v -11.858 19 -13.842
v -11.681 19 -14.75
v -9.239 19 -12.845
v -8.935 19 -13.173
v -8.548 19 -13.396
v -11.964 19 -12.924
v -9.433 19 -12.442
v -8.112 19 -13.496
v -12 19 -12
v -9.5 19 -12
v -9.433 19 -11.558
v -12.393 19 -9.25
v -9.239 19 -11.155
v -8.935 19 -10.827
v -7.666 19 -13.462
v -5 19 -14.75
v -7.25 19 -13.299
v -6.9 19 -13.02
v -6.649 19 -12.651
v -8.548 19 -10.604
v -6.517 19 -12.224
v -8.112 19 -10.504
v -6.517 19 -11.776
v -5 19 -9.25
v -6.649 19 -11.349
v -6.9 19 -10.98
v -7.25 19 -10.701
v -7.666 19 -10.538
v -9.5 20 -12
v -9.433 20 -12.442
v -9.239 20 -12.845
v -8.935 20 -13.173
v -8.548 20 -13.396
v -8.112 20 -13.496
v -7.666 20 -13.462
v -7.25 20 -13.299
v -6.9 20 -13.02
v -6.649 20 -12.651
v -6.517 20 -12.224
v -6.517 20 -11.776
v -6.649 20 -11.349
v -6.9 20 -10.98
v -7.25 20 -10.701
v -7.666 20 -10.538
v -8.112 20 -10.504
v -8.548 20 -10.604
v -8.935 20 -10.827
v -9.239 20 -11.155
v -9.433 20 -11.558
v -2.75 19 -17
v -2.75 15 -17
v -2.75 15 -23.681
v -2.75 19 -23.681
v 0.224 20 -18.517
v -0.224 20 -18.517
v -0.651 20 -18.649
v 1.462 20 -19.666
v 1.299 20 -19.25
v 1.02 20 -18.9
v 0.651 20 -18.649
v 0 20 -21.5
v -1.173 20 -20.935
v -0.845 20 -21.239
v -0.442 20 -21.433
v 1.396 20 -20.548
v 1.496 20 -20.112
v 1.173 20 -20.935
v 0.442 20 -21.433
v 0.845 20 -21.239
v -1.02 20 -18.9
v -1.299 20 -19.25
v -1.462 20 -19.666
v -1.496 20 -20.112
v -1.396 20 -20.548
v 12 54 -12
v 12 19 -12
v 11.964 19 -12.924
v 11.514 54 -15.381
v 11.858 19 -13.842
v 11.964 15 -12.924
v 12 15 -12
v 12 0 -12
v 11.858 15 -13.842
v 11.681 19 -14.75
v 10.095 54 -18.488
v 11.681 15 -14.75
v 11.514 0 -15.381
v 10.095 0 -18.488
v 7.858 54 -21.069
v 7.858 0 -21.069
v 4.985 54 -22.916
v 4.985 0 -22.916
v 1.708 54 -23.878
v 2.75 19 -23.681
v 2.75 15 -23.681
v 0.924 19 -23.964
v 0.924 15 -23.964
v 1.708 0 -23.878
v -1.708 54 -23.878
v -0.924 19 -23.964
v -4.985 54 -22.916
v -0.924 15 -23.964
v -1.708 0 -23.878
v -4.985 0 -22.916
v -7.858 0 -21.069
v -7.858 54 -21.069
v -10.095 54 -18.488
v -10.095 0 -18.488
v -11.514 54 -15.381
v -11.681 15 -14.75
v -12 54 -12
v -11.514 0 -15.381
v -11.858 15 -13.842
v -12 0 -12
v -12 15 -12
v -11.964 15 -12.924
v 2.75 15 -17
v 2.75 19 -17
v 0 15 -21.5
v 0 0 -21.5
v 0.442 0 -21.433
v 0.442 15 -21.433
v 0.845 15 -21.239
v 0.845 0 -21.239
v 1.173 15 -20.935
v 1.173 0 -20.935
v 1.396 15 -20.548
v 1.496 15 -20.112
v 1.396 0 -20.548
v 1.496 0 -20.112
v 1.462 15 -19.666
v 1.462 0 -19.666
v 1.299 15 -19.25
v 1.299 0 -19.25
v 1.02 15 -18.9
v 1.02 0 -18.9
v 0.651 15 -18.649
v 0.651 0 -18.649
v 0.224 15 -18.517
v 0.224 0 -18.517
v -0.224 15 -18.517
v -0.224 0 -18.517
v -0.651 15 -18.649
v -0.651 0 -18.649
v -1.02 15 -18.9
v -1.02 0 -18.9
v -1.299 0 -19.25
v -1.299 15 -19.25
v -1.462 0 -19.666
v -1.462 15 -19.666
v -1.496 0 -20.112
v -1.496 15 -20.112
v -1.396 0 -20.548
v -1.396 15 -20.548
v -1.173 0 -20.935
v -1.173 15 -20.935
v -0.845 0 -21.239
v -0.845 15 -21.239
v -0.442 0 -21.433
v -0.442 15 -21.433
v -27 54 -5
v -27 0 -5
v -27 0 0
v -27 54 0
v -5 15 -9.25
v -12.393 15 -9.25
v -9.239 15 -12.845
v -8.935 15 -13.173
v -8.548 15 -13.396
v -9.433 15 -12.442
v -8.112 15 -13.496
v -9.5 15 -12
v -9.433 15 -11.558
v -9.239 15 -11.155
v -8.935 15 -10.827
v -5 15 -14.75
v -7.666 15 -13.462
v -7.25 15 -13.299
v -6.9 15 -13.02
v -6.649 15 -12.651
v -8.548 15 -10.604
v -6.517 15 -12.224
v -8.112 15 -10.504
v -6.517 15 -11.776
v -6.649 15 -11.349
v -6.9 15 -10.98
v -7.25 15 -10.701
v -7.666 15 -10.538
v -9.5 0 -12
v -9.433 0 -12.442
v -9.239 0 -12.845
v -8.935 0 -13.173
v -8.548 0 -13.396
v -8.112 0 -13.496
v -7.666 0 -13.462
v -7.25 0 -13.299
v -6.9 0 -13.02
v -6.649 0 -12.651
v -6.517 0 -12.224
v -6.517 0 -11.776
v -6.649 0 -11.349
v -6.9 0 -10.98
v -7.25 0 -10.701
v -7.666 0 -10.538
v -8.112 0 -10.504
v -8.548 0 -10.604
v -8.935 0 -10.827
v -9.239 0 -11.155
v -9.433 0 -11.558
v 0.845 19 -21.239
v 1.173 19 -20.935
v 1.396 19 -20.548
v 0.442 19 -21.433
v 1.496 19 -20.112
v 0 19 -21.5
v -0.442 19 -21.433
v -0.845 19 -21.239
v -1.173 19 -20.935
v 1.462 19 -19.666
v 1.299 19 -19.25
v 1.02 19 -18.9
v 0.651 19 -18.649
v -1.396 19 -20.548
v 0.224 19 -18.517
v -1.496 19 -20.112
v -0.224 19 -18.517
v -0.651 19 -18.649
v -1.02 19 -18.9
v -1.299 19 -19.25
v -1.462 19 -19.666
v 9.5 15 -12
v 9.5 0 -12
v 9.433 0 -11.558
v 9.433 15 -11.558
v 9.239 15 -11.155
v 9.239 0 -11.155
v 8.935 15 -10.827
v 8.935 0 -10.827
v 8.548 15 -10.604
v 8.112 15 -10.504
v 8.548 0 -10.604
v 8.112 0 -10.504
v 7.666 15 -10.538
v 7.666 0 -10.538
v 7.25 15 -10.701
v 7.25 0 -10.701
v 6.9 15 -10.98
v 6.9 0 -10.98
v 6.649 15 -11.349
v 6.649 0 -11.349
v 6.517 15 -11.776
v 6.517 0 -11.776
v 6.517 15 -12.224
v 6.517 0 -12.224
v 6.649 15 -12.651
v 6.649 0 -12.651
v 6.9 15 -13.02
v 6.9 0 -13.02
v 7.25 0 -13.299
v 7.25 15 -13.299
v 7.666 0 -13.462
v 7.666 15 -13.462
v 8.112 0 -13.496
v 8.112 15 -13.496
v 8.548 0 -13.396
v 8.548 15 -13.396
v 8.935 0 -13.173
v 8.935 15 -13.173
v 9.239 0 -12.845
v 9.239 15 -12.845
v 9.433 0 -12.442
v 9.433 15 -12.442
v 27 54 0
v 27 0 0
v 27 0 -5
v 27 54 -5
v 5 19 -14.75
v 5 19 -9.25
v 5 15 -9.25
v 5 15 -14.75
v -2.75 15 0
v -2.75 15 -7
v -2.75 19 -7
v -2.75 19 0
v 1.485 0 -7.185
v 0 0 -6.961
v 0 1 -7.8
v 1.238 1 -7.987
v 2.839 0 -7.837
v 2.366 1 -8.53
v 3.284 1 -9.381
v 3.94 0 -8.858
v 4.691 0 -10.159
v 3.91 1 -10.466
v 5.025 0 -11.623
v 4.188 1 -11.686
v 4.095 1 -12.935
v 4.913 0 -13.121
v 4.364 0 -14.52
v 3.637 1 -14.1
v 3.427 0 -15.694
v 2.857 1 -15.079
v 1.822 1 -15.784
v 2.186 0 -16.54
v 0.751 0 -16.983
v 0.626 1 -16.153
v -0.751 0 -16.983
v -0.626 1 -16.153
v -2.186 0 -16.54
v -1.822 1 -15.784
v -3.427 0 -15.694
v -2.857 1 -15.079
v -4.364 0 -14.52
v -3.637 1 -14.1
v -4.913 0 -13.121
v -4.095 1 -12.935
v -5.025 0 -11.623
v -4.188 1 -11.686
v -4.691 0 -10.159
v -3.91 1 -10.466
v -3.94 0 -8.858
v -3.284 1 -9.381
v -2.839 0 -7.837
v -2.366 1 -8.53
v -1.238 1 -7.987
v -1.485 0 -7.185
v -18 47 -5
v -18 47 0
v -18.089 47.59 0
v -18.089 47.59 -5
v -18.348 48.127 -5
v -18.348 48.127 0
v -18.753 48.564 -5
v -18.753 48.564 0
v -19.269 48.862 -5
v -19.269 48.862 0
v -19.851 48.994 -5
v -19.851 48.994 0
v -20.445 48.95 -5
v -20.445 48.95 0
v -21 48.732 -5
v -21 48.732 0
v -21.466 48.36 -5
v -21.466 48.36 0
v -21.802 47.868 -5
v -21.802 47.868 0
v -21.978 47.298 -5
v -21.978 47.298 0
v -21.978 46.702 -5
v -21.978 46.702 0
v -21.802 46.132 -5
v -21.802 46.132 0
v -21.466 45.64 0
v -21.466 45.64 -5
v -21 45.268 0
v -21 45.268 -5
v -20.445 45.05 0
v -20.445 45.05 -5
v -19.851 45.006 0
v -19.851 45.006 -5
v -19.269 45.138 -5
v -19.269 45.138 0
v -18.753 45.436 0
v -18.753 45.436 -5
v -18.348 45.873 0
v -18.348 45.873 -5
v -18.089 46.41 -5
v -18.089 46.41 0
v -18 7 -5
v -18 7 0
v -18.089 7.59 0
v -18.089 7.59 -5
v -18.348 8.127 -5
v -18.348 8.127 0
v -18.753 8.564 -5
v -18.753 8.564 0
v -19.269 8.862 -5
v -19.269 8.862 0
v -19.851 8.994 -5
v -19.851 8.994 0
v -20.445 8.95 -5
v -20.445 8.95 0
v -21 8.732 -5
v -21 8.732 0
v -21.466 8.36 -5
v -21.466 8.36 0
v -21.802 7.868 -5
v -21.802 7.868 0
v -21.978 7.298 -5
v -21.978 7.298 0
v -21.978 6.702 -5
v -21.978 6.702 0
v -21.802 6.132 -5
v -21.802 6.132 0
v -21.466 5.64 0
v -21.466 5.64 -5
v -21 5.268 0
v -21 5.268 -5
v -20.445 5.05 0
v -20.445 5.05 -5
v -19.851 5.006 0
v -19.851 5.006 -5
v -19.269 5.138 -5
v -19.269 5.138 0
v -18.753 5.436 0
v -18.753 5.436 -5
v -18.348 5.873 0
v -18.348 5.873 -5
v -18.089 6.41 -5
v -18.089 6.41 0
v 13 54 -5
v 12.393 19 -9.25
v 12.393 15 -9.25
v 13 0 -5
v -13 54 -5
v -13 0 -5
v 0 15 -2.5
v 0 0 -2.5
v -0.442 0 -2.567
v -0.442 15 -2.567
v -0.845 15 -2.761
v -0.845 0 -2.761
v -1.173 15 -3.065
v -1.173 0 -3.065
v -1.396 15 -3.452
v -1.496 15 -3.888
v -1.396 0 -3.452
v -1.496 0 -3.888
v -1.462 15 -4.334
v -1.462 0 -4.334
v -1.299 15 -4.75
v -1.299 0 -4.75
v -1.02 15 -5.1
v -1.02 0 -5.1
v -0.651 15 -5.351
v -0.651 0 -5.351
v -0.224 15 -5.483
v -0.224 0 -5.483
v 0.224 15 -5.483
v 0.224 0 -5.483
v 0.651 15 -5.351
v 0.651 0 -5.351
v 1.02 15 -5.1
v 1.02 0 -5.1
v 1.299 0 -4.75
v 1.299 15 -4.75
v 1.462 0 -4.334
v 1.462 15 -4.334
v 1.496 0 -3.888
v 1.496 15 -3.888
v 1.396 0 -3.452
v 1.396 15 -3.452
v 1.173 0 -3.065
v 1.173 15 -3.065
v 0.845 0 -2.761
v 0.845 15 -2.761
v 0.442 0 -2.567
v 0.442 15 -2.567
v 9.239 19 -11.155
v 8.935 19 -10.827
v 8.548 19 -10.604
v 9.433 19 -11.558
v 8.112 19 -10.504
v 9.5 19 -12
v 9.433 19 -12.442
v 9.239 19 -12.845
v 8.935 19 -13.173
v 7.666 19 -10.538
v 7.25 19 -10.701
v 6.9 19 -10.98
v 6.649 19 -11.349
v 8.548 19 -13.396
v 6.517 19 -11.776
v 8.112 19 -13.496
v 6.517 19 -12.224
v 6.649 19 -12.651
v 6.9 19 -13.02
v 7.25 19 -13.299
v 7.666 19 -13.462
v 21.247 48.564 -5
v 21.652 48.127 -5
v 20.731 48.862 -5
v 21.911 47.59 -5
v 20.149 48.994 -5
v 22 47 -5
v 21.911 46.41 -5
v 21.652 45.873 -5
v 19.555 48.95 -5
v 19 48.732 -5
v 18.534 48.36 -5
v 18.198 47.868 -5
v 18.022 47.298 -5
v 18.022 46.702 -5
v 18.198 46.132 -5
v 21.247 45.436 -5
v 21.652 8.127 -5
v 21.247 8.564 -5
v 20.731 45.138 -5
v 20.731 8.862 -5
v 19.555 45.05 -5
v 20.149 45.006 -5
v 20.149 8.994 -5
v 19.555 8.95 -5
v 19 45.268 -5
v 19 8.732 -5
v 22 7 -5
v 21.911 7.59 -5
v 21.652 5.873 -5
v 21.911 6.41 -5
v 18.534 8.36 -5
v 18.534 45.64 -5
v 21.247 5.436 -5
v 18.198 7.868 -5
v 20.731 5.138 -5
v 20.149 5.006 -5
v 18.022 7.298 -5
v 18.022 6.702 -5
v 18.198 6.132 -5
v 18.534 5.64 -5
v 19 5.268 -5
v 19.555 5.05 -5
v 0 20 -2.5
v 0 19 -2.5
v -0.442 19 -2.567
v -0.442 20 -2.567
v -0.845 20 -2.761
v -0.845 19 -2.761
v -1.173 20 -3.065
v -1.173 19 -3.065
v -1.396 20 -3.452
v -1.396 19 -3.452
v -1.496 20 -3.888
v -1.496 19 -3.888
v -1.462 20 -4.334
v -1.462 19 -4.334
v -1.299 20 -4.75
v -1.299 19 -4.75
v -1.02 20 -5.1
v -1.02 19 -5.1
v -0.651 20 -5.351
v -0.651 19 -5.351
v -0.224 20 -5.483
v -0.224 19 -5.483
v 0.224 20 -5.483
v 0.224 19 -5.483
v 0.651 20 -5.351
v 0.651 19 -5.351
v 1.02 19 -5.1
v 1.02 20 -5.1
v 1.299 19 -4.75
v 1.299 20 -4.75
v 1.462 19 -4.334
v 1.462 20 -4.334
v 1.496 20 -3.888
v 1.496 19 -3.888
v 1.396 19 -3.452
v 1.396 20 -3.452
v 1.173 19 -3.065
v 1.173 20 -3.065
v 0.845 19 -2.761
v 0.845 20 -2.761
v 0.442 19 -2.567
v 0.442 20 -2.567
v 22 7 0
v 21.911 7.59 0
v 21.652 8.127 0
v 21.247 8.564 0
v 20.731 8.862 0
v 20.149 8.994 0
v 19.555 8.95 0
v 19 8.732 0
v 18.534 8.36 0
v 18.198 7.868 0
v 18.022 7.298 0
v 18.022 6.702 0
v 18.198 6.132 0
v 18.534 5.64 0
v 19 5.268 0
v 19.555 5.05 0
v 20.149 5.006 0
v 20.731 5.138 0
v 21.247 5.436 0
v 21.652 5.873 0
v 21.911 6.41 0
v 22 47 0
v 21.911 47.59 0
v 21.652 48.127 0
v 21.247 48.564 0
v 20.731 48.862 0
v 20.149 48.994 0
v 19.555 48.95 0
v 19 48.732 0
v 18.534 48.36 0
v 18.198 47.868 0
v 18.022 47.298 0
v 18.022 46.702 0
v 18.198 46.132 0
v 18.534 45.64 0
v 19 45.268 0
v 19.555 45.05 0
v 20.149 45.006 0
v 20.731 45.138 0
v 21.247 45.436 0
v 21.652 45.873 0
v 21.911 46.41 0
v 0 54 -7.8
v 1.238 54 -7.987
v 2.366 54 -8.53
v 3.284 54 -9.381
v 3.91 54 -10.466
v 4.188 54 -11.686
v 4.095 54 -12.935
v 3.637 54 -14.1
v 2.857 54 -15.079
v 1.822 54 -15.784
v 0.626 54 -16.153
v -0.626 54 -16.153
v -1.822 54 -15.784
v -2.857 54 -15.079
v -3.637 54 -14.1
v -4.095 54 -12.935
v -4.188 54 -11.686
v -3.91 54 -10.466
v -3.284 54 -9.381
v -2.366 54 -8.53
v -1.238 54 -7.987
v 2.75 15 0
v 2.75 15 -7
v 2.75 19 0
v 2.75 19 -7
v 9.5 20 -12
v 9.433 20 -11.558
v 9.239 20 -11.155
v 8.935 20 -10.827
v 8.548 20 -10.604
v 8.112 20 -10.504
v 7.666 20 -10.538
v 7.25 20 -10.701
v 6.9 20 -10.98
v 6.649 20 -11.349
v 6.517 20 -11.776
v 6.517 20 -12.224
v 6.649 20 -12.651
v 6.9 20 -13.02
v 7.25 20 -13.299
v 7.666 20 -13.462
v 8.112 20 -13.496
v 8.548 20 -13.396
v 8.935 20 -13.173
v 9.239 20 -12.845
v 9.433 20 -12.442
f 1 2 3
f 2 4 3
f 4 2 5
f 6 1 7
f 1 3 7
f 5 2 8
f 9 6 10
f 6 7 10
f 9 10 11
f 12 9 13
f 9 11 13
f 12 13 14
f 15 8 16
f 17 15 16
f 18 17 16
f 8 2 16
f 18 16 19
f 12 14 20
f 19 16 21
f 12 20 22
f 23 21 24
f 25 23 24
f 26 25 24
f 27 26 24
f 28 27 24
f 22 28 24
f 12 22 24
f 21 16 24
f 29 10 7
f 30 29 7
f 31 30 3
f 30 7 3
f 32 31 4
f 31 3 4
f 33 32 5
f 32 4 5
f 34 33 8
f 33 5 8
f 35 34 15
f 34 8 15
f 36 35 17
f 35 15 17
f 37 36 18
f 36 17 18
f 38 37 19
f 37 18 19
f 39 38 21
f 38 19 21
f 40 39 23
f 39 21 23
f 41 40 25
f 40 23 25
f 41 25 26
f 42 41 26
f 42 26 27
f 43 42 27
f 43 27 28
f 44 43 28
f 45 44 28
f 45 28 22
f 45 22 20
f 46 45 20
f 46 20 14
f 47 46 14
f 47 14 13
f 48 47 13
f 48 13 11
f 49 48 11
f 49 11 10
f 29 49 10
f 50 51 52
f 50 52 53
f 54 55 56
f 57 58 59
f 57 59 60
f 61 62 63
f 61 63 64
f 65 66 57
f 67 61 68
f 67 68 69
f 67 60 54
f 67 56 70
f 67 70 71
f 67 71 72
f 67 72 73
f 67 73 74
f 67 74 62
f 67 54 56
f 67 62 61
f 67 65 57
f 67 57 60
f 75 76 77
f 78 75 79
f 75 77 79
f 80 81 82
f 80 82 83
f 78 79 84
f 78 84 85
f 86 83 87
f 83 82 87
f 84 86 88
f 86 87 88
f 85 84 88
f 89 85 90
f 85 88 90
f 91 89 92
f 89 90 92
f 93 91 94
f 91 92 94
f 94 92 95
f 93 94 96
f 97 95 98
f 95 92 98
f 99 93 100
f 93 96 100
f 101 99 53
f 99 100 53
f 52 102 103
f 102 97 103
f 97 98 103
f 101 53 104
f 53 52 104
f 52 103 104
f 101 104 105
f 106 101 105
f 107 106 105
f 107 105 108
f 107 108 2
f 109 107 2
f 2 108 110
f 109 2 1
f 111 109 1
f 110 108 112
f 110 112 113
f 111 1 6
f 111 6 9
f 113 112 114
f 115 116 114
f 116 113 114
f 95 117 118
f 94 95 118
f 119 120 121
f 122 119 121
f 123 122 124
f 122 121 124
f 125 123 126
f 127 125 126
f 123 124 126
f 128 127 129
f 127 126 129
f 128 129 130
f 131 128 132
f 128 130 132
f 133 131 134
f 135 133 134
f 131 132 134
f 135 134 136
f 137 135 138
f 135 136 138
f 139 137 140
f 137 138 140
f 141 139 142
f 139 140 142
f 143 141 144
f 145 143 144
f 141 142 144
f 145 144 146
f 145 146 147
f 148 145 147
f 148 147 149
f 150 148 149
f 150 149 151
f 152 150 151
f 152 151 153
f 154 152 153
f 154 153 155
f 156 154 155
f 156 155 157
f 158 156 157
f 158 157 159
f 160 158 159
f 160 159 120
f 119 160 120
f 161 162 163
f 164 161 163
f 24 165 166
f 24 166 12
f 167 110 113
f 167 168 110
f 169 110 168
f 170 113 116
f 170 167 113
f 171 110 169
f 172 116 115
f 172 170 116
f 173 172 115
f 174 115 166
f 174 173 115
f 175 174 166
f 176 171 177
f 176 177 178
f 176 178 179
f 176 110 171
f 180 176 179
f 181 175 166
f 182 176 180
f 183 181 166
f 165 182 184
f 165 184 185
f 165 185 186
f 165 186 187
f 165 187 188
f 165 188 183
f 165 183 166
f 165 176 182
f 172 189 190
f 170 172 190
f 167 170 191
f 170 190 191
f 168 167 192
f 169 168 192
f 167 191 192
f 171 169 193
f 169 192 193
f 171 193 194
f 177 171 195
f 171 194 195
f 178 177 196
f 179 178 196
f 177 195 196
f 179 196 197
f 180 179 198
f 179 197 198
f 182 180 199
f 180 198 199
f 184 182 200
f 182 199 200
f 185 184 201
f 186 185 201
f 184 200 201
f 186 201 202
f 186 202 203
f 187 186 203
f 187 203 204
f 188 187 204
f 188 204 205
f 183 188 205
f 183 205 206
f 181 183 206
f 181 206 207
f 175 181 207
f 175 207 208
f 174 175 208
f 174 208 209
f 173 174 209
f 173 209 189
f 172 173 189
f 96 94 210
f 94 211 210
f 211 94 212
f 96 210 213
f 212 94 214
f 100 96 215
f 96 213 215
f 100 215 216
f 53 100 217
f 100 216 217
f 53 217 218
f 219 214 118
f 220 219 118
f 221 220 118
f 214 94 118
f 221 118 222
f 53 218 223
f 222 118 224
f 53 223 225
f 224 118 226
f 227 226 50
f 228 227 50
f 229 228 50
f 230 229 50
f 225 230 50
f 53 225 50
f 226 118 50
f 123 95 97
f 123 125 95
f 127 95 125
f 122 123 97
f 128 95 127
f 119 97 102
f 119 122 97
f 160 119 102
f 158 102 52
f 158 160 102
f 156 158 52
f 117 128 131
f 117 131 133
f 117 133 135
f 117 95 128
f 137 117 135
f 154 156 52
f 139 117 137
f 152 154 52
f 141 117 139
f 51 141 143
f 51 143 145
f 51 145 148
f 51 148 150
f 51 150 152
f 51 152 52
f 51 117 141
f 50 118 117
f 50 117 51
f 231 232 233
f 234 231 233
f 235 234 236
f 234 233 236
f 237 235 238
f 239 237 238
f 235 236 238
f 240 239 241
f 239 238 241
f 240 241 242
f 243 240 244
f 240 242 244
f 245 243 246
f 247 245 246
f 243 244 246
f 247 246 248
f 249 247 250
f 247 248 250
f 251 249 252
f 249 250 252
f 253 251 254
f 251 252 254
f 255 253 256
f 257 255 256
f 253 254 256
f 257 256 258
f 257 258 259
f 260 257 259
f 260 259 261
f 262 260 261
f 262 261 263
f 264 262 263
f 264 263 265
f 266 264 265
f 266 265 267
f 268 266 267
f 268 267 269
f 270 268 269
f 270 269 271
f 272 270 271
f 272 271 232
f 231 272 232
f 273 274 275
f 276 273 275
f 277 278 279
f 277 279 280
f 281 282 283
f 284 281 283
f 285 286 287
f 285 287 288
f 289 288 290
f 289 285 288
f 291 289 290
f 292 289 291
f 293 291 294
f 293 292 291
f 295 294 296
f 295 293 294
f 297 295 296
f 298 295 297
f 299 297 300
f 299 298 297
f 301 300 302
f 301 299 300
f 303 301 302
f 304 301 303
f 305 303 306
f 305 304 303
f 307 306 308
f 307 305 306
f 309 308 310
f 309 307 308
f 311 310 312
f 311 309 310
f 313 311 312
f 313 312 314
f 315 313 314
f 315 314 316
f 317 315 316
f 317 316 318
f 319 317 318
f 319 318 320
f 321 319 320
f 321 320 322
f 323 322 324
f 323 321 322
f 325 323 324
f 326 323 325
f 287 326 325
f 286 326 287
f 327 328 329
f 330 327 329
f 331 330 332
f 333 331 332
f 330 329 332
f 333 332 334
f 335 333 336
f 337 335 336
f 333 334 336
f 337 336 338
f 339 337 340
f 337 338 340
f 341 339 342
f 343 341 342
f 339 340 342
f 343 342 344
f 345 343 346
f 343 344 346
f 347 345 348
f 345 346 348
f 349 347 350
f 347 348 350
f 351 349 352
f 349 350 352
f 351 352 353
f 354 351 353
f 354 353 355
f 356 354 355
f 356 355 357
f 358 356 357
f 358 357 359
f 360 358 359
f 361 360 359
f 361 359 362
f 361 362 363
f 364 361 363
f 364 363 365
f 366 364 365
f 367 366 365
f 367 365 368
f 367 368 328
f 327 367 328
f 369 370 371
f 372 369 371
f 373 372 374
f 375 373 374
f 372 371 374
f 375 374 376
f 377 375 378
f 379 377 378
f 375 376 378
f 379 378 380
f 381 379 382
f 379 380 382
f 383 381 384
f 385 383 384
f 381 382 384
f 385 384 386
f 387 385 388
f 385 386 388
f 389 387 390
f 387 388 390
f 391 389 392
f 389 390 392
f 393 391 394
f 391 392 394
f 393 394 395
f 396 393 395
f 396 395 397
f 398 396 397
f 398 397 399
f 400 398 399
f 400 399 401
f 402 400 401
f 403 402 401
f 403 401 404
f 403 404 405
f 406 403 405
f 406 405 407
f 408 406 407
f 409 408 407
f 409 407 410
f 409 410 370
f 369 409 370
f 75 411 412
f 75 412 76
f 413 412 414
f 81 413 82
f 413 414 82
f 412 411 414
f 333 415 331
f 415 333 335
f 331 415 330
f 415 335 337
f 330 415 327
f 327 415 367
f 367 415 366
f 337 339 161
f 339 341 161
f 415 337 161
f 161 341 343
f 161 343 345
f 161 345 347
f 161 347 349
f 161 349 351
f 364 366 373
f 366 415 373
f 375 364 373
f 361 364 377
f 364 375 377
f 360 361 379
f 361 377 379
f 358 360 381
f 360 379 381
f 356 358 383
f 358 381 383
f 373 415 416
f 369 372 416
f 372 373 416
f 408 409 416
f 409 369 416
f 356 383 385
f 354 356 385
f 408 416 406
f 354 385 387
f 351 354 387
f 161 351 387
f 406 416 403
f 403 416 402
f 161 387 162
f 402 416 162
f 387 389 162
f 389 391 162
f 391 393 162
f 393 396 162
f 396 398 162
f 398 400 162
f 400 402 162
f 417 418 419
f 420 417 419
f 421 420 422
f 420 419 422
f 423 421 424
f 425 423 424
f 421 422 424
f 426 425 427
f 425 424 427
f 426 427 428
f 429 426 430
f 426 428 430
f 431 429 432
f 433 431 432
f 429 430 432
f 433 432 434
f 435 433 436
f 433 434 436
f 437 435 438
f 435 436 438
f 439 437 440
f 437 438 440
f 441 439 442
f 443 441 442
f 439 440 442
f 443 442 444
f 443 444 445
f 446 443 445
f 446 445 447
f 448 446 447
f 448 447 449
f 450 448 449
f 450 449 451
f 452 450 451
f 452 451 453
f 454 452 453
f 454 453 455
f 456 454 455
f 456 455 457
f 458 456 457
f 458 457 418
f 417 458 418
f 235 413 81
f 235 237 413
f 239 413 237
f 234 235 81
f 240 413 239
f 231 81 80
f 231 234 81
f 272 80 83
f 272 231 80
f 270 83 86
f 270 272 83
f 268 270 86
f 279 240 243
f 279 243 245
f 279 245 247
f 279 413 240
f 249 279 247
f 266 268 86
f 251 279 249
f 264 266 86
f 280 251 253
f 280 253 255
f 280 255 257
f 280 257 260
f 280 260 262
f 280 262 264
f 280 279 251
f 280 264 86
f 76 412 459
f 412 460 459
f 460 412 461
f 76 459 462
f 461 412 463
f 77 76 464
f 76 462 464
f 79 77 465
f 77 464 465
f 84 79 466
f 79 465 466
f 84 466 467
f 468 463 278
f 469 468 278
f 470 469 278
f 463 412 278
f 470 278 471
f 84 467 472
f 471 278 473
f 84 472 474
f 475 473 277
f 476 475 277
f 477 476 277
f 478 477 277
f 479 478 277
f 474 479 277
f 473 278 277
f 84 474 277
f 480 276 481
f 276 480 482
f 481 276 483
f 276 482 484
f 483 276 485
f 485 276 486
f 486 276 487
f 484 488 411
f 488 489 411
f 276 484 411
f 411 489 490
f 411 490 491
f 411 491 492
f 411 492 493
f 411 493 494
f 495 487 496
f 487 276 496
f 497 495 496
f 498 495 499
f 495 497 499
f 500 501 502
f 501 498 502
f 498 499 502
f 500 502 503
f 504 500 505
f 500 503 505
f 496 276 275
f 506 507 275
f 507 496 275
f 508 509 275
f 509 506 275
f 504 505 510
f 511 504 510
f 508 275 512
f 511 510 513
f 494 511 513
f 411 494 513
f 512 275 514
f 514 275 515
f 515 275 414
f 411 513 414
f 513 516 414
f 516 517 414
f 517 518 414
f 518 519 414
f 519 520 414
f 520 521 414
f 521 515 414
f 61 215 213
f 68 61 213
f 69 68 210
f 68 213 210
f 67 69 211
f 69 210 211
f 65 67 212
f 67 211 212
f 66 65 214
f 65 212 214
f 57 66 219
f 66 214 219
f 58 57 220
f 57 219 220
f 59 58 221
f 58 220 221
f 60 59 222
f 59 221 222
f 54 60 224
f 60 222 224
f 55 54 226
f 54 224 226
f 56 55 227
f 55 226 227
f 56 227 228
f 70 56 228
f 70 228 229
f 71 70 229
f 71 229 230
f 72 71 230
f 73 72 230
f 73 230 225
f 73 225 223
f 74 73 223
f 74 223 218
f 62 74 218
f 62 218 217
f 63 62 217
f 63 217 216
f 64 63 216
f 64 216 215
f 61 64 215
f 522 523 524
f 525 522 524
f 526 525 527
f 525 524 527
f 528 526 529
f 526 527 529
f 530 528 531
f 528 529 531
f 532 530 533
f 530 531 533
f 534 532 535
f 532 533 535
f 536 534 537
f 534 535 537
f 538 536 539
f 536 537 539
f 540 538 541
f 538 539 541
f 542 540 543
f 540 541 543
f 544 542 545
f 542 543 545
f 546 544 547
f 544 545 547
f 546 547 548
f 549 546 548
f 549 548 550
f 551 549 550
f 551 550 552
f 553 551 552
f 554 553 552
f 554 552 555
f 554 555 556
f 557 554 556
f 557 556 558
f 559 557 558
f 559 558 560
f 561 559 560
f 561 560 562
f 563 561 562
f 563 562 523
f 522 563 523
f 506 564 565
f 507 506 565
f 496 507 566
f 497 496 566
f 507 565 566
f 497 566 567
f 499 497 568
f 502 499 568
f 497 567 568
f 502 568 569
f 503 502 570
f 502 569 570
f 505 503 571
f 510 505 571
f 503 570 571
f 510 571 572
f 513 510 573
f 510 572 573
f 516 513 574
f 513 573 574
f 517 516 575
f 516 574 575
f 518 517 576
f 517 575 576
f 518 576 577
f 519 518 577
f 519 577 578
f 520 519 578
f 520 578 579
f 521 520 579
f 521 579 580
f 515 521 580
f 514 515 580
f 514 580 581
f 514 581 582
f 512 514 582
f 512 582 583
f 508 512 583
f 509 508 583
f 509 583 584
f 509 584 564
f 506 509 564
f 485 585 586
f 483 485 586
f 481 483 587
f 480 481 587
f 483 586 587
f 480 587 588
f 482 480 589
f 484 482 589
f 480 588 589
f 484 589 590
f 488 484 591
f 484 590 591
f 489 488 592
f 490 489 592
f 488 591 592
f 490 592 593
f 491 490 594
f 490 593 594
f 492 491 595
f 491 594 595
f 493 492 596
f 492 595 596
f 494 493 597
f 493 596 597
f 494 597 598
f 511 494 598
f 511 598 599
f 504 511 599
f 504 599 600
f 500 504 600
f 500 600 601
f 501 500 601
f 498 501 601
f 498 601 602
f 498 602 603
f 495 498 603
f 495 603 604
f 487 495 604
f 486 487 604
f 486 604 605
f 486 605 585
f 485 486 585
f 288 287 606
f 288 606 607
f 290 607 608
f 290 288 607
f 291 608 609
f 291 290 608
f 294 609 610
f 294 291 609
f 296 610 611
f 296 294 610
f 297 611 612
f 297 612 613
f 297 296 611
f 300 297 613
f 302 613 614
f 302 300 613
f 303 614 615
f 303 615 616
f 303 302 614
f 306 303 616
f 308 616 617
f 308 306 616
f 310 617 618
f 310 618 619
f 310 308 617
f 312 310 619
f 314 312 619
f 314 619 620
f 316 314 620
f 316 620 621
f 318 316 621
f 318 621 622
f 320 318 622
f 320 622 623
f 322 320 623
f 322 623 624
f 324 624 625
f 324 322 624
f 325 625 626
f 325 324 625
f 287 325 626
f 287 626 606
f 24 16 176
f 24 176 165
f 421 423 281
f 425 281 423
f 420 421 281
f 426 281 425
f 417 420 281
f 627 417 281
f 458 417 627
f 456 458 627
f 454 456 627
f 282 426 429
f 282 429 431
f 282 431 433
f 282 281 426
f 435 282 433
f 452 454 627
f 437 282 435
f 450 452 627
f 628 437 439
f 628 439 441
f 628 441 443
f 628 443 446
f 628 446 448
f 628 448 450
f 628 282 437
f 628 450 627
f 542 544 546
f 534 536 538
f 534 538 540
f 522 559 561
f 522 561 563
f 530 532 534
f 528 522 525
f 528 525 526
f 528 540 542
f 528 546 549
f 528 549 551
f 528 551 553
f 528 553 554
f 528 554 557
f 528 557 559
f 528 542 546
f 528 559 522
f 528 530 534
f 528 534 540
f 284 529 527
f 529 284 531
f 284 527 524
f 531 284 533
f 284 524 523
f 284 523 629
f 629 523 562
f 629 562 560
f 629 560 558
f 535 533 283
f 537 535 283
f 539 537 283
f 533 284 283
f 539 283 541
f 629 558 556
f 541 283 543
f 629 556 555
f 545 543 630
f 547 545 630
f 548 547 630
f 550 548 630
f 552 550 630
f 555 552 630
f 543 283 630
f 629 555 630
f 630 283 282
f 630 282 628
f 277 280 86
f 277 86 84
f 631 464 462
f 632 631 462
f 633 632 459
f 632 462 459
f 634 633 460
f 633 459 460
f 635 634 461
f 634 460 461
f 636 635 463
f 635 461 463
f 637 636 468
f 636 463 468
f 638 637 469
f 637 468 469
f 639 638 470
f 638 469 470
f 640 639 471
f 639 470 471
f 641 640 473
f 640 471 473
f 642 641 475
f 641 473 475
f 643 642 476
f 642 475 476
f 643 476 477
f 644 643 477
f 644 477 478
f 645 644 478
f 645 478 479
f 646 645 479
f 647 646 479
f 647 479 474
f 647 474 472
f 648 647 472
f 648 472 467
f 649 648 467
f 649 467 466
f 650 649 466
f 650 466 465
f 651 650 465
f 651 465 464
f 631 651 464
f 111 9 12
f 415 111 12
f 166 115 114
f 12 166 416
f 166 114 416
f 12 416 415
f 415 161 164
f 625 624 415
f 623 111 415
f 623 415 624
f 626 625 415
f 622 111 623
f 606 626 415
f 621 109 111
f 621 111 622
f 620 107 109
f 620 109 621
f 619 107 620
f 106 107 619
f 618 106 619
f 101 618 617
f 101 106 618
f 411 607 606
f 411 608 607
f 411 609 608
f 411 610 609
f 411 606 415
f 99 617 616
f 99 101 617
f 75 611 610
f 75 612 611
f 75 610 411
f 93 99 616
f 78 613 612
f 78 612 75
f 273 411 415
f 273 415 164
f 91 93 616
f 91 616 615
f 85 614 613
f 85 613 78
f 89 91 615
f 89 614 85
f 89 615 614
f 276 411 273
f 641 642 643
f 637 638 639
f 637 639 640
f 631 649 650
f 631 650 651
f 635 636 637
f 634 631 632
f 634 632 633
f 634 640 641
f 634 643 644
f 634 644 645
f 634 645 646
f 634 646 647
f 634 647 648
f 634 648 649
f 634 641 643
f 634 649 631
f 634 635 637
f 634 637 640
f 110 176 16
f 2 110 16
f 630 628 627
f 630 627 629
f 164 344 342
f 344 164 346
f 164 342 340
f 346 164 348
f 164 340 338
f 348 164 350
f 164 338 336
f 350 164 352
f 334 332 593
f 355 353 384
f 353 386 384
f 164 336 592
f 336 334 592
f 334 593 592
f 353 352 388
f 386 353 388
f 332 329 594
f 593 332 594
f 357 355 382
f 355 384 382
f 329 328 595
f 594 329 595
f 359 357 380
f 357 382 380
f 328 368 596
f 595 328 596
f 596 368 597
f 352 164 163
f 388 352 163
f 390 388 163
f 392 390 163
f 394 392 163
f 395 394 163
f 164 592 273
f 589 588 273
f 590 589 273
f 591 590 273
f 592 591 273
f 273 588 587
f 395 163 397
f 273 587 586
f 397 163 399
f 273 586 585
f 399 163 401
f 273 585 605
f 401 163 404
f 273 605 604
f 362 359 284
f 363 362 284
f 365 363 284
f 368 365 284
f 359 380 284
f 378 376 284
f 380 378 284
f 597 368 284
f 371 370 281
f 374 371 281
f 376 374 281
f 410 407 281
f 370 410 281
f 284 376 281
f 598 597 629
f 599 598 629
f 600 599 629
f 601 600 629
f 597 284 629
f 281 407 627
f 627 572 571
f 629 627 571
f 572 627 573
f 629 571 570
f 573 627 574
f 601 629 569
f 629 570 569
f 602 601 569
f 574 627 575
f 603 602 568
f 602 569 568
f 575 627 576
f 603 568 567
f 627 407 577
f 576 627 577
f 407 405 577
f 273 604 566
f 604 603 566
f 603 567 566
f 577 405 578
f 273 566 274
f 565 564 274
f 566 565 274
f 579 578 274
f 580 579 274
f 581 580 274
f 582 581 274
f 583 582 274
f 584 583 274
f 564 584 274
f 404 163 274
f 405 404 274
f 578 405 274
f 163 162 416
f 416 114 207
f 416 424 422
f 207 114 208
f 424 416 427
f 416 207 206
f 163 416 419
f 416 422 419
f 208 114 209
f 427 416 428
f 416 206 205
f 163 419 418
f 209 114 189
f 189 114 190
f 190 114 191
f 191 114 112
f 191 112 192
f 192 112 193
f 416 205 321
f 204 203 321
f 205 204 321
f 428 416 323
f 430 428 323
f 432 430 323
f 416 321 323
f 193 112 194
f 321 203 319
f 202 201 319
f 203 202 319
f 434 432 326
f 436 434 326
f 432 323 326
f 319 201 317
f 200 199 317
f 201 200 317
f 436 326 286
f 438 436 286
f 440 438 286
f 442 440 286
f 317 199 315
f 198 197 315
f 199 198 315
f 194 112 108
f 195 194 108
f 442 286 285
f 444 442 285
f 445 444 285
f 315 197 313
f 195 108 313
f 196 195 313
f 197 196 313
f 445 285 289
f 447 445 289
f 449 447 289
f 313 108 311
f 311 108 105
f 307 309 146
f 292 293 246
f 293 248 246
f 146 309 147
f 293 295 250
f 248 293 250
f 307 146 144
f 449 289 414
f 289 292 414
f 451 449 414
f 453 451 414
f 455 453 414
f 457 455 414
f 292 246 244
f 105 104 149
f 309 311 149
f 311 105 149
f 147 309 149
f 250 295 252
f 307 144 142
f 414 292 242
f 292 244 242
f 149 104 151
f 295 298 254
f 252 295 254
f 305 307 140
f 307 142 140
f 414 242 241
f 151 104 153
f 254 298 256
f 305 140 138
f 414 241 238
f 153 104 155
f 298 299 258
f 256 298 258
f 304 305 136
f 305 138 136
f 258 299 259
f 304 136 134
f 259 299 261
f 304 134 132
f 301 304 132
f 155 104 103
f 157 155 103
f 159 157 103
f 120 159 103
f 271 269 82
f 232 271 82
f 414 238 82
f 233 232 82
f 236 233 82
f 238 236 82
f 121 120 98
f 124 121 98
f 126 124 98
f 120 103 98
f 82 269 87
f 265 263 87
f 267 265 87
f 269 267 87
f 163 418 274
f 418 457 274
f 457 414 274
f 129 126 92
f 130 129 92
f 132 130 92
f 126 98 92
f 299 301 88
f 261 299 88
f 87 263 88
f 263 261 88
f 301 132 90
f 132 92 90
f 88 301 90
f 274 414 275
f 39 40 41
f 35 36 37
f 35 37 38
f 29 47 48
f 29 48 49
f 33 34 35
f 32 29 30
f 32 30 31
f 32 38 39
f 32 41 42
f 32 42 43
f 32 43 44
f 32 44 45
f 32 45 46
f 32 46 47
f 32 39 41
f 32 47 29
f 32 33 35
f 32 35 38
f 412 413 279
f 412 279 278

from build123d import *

# Parameters (mm, degrees)
SZKIC1_R                    = 12
SZKIC1_R_2                  = 4.2
DODANIE_WYCI_GNI_CIE1_DEPTH = 54
DODANIE_WYCI_GNI_CIE2_DEPTH = 54
SZKIC4_R                    = 1.5
WYTNIJ_WYCI_GNI_CIE1_DEPTH  = 20
SZYK_KO_OWY1_COUNT          = 4
WYTNIJ_WYCI_GNI_CIE2_START  = -7
SZKIC5_W                    = 5.5
SZKIC5_H                    = 4
WYTNIJ_WYCI_GNI_CIE2_DEPTH  = 10
SZYK_KO_OWY2_COUNT          = 4
SFAZOWANIE1_SIZE            = 1
SFAZOWANIE1_SIZE2           = 0.839099631
WYTNIJ_WYCI_GNI_CIE3_REACH  = 66.969
SZKIC6_R                    = 2


with BuildPart() as part:
    # Szkic1 → Dodanie-wyciągnięcie1 (new body)
    with BuildSketch(Plane(origin=(0, 0, 0), x_dir=(1, 0, 0), z_dir=(0, 1, 0))):
        with Locations(Location((0, 12, 0), (0, 0, 270))):
            Circle(SZKIC1_R)
        with Locations(Location((0, 12, 0), (0, 0, 270))):
            Circle(SZKIC1_R_2, mode=Mode.SUBTRACT)
    extrude(amount=DODANIE_WYCI_GNI_CIE1_DEPTH)

    # Szkic3 → Dodanie-wyciągnięcie2 (add)
    with BuildSketch(Plane(origin=(0, 0, 0), x_dir=(1, 0, 0), z_dir=(0, 1, 0))):
        Polygon((0, 0), (27, 0), (27, 5), (13, 5), (12, 12), (0, 5.166487606), (-12, 12), (-13, 5), (-27, 5), (-27, 0), align=None)
    extrude(amount=DODANIE_WYCI_GNI_CIE2_DEPTH)

    # Szkic4 → Wytnij-wyciągnięcie1 (cut)
    with BuildSketch(Plane(origin=(0, 0, 0), x_dir=(-1, 0, 0), z_dir=(0, -1, 0))):
        with Locations(Location((0, 20, 0), (0, 0, 90))):
            Circle(SZKIC4_R)
    wytnij_wyci_gni_cie1 = extrude(amount=-WYTNIJ_WYCI_GNI_CIE1_DEPTH, mode=Mode.SUBTRACT)

    # Szyk kołowy1: Wytnij-wyciągnięcie1 ×4 about axis
    szyk_ko_owy1_axis = Axis((0, 0, -12), (0, 1, 0))
    for i in range(1, SZYK_KO_OWY1_COUNT):
        add(wytnij_wyci_gni_cie1.rotate(szyk_ko_owy1_axis, i * 360 / SZYK_KO_OWY1_COUNT), mode=Mode.SUBTRACT)

    # Szkic5 → Wytnij-wyciągnięcie2 (cut)
    with BuildSketch(Plane.XY.offset(WYTNIJ_WYCI_GNI_CIE2_START)):
        with Locations((0, 17)):
            Rectangle(SZKIC5_W, SZKIC5_H)
    wytnij_wyci_gni_cie2 = extrude(amount=WYTNIJ_WYCI_GNI_CIE2_DEPTH, mode=Mode.SUBTRACT)

    # Szyk kołowy2: Wytnij-wyciągnięcie2 ×4 about axis
    szyk_ko_owy2_axis = Axis((0, 0, -12), (0, 1, 0))
    for i in range(1, SZYK_KO_OWY2_COUNT):
        add(wytnij_wyci_gni_cie2.rotate(szyk_ko_owy2_axis, i * 360 / SZYK_KO_OWY2_COUNT), mode=Mode.SUBTRACT)

    # Sfazowanie1
    sfazowanie1_edges = [part.edges().sort_by_distance(p)[0] for p in [
        (0, 0, -16.2),
    ]]
    sfazowanie1_side = [part.faces().sort_by_distance(p)[0] for p in [
        (0, 27, -16.2),
    ]]
    chamfer(sfazowanie1_edges, length=SFAZOWANIE1_SIZE, length2=SFAZOWANIE1_SIZE2, reference=sfazowanie1_side[0])

    # Szkic6 → Wytnij-wyciągnięcie3 (cut, up to next)
    with BuildSketch(Plane.XY, mode=Mode.PRIVATE) as wytnij_wyci_gni_cie3_sk1:
        with Locations((-20, 47)):
            Circle(SZKIC6_R)
    wytnij_wyci_gni_cie3_tool1 = extrude(wytnij_wyci_gni_cie3_sk1.sketch, amount=-WYTNIJ_WYCI_GNI_CIE3_REACH, mode=Mode.PRIVATE) & part.part
    # Szkic6 → Wytnij-wyciągnięcie3 (cut, up to next)
    with BuildSketch(Plane.XY, mode=Mode.PRIVATE) as wytnij_wyci_gni_cie3_sk2:
        with Locations((20, 47)):
            Circle(SZKIC6_R)
    wytnij_wyci_gni_cie3_tool2 = extrude(wytnij_wyci_gni_cie3_sk2.sketch, amount=-WYTNIJ_WYCI_GNI_CIE3_REACH, mode=Mode.PRIVATE) & part.part
    # Szkic6 → Wytnij-wyciągnięcie3 (cut, up to next)
    with BuildSketch(Plane.XY, mode=Mode.PRIVATE) as wytnij_wyci_gni_cie3_sk3:
        with Locations((20, 7)):
            Circle(SZKIC6_R)
    wytnij_wyci_gni_cie3_tool3 = extrude(wytnij_wyci_gni_cie3_sk3.sketch, amount=-WYTNIJ_WYCI_GNI_CIE3_REACH, mode=Mode.PRIVATE) & part.part
    # Szkic6 → Wytnij-wyciągnięcie3 (cut, up to next)
    with BuildSketch(Plane.XY, mode=Mode.PRIVATE) as wytnij_wyci_gni_cie3_sk4:
        with Locations((-20, 7)):
            Circle(SZKIC6_R)
    wytnij_wyci_gni_cie3_tool4 = extrude(wytnij_wyci_gni_cie3_sk4.sketch, amount=-WYTNIJ_WYCI_GNI_CIE3_REACH, mode=Mode.PRIVATE) & part.part
    add(wytnij_wyci_gni_cie3_tool1.solids().sort_by_distance((-20, 47, 0))[0], mode=Mode.SUBTRACT)
    add(wytnij_wyci_gni_cie3_tool2.solids().sort_by_distance((20, 47, 0))[0], mode=Mode.SUBTRACT)
    add(wytnij_wyci_gni_cie3_tool3.solids().sort_by_distance((20, 7, 0))[0], mode=Mode.SUBTRACT)
    add(wytnij_wyci_gni_cie3_tool4.solids().sort_by_distance((-20, 7, 0))[0], mode=Mode.SUBTRACT)


solid = part.part
